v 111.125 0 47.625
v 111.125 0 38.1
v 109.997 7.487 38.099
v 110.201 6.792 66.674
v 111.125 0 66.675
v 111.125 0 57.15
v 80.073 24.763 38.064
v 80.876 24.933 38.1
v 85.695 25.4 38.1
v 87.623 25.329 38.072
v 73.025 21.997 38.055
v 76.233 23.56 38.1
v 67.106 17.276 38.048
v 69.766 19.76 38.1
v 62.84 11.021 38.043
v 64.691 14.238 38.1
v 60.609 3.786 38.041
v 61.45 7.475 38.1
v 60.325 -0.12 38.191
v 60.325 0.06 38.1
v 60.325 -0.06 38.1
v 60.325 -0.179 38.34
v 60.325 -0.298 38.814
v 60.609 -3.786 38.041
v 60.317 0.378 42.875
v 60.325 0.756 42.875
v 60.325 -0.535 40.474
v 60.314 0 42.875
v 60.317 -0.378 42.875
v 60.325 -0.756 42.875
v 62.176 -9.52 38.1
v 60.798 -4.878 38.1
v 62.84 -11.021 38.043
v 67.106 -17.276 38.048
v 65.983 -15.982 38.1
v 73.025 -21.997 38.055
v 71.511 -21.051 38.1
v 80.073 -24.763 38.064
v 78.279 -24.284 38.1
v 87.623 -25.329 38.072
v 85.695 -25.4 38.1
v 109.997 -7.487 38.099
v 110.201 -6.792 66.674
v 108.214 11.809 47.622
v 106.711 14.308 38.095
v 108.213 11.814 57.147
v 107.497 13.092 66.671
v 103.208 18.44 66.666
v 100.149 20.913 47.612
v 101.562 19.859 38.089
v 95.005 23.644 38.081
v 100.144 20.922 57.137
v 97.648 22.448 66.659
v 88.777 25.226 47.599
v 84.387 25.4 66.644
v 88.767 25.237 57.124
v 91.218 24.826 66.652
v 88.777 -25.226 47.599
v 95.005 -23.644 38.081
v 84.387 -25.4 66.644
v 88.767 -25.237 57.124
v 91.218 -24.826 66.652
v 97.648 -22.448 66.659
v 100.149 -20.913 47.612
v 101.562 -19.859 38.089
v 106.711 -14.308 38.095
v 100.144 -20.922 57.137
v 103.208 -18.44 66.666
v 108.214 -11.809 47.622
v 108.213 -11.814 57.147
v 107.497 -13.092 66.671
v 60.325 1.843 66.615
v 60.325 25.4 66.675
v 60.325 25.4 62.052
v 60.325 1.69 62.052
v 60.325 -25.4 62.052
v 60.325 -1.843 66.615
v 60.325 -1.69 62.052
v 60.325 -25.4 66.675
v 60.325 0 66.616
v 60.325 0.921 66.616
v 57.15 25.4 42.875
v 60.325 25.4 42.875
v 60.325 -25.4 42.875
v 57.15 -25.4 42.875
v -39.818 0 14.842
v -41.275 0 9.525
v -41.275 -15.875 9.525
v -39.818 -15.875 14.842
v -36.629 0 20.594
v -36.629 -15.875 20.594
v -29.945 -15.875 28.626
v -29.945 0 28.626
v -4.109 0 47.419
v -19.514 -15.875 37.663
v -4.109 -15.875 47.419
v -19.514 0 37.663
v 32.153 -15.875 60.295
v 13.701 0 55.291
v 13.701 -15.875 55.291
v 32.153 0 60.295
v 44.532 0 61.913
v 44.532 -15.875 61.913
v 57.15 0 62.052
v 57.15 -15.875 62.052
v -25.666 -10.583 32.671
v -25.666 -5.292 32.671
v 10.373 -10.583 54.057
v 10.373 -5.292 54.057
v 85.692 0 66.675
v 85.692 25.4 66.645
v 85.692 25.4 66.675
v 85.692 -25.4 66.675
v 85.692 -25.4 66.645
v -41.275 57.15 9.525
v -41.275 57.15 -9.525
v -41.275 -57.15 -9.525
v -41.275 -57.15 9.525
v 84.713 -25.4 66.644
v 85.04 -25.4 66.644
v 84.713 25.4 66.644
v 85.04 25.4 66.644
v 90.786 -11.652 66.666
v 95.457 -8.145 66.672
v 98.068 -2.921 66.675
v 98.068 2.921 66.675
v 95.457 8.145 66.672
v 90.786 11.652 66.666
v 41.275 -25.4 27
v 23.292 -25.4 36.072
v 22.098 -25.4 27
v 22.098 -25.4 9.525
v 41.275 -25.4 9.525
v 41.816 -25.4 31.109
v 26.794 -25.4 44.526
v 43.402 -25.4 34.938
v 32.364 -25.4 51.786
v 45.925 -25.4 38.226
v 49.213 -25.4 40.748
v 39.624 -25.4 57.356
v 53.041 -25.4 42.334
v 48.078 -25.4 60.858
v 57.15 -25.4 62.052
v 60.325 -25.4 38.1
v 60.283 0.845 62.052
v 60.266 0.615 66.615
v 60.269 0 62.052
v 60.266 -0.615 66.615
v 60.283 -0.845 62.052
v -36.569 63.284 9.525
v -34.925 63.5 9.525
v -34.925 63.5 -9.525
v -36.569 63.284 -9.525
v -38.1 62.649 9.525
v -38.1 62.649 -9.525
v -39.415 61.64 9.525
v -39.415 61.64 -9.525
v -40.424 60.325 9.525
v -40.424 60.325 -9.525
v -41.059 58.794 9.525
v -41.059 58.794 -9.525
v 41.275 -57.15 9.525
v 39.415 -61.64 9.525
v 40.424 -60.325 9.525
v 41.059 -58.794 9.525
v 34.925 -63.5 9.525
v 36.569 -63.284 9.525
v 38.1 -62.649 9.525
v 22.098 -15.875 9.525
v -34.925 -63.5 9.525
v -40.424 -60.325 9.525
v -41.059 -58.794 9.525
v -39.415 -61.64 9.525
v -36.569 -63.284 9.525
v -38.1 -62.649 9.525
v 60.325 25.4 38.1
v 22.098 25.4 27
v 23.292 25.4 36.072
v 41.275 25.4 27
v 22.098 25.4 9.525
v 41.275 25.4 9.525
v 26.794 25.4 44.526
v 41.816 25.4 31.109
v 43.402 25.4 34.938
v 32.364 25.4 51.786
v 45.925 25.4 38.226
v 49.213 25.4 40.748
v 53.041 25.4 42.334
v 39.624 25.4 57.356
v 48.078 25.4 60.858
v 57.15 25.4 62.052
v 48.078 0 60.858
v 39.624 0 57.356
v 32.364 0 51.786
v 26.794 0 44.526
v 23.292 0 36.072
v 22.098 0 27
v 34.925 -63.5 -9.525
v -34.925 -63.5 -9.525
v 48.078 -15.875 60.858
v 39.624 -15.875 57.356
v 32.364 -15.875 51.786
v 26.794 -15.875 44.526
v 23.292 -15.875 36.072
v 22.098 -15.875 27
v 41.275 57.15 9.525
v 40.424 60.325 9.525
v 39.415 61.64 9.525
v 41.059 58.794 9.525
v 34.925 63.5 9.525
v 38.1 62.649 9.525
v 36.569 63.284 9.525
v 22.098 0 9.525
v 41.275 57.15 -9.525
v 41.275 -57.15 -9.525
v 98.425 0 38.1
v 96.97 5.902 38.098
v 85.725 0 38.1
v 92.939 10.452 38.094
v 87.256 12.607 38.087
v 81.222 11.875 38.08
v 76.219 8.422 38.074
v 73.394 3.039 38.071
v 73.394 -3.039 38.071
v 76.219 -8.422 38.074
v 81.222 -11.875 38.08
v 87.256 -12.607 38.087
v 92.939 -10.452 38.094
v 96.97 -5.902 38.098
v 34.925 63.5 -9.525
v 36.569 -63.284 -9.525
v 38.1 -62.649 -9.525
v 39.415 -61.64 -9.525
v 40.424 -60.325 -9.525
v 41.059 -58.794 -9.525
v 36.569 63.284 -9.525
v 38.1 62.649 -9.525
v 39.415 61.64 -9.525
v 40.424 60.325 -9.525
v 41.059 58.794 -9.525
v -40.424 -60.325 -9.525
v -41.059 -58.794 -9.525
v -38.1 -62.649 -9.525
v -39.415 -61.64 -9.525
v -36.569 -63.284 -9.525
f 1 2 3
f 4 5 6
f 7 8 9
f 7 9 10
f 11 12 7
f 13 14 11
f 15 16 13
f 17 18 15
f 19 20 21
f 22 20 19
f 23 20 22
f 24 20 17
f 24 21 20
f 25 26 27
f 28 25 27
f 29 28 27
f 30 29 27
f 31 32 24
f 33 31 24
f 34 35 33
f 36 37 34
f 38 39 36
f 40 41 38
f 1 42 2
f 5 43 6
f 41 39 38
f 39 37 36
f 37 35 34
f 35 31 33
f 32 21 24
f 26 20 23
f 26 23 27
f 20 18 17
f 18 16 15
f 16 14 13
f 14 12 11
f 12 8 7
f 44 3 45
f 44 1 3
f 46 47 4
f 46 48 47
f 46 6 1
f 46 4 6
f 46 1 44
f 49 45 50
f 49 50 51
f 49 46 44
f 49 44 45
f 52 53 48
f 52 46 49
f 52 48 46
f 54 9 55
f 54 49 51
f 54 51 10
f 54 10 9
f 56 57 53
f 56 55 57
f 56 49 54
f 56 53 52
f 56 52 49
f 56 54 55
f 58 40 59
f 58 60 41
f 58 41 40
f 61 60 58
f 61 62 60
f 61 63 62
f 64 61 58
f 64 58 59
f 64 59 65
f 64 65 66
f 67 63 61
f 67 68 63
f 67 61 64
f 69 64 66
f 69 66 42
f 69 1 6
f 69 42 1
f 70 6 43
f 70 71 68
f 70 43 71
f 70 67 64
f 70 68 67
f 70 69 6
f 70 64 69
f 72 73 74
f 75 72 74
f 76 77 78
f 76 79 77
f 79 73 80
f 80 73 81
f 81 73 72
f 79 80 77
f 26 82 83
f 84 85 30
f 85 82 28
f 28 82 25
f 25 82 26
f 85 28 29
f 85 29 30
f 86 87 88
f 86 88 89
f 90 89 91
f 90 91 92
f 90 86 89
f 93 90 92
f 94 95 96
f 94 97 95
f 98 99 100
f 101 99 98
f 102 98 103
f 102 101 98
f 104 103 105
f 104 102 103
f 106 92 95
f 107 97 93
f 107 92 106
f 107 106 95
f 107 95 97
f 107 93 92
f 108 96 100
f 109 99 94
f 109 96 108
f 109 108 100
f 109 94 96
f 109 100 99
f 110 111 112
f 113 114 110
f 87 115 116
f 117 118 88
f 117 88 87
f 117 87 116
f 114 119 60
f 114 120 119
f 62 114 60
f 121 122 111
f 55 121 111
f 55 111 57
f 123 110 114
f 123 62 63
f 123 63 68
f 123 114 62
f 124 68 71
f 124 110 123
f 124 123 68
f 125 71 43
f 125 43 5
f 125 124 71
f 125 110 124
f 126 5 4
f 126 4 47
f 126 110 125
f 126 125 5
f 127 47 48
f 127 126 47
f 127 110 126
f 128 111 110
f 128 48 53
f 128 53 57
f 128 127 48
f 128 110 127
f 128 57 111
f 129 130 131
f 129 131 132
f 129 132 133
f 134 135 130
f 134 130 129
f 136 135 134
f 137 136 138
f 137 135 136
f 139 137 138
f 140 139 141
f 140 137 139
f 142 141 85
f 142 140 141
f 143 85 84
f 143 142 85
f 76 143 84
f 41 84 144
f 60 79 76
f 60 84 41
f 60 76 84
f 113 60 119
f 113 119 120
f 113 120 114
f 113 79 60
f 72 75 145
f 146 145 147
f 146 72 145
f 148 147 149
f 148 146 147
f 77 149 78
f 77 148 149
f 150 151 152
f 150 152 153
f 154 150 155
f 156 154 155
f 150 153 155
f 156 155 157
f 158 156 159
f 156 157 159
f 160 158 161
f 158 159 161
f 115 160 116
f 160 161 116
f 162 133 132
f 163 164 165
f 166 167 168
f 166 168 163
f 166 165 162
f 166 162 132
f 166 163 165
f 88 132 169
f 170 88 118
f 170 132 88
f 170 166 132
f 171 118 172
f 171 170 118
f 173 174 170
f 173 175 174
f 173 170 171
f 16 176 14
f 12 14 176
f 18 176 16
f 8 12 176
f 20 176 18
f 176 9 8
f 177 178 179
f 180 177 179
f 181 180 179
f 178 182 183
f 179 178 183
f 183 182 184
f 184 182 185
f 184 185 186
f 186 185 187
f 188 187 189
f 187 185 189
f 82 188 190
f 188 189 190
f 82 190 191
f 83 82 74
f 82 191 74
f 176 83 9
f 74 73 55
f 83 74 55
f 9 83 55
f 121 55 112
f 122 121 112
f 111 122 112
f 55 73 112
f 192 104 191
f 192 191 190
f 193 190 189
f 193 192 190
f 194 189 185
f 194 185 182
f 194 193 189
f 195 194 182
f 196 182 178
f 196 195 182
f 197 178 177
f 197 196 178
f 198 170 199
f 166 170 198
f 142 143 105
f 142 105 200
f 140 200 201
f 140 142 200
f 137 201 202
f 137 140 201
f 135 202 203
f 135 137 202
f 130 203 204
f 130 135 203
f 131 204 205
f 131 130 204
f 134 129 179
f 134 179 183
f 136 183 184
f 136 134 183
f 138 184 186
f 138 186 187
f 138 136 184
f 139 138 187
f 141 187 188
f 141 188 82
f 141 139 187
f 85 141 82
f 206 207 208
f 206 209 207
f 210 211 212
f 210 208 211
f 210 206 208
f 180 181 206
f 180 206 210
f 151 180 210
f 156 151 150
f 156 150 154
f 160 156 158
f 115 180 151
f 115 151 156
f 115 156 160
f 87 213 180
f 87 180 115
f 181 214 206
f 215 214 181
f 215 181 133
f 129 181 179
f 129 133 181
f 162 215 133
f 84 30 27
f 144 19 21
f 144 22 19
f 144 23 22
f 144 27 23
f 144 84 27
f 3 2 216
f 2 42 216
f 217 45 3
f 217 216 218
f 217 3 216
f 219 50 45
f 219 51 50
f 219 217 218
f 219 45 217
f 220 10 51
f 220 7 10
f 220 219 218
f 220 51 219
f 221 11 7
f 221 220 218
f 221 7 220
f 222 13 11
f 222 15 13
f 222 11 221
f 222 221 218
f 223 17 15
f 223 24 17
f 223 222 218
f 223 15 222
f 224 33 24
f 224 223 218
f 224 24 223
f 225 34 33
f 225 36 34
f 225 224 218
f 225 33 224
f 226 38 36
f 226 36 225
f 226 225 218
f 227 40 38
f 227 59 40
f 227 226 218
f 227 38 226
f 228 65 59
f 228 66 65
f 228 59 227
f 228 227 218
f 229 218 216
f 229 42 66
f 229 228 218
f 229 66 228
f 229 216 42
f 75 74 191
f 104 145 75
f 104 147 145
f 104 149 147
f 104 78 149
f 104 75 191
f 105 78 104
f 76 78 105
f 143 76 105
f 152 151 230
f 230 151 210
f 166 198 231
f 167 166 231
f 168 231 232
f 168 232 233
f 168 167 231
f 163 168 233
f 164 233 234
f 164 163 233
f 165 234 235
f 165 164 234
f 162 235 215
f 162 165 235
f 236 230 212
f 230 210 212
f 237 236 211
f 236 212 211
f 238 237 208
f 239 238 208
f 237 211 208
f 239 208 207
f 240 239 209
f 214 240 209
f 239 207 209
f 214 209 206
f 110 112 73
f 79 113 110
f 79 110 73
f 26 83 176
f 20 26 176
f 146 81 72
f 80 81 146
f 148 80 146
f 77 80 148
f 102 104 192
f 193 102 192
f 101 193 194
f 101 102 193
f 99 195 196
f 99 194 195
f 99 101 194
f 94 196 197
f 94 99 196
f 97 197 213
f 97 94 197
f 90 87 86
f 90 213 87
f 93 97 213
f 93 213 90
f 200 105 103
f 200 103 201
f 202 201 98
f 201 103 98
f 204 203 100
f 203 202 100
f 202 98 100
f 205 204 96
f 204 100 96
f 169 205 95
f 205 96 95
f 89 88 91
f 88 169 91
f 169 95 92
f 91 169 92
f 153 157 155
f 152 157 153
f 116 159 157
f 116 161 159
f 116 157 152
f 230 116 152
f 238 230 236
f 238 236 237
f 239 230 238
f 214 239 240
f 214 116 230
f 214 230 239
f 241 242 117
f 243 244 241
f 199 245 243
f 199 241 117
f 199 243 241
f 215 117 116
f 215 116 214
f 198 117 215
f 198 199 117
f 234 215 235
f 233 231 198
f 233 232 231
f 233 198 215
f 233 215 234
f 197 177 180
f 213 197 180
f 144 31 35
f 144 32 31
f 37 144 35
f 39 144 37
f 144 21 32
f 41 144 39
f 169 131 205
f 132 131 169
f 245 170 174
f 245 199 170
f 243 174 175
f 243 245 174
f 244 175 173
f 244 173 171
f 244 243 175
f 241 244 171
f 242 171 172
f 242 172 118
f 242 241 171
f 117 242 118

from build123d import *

# Parameters (mm, degrees)
F1_DEPTH = 63.5
F2_DEPTH = 25.4
F3_DEPTH = 15.875
F5_R     = 6.35


with BuildPart() as f1:
    # F0 (on Front) → F1 (new body, symmetric)
    with BuildSketch(Plane.XZ):
        Polygon((-41.275, -9.525), (41.275, -9.525), (41.275, 9.525), (22.098, 9.525), (-41.275, 9.525), align=None)
    extrude(amount=F1_DEPTH, both=True)

    # F0 (on Front) → F2 (join, symmetric)
    with BuildSketch(Plane.XZ):
        with BuildLine():
            Line((22.098, 9.525), (41.275, 9.525))
            Line((41.275, 9.525), (41.275, 27.0002))
            ThreePointArc((41.275, 27.0002), (45.9246798487, 38.2255201513), (57.15, 42.8752))
            Line((57.15, 42.8752), (60.325, 42.8752))
            Line((60.325, 42.8752), (60.325, 62.0522))
            Line((60.325, 62.0522), (57.15, 62.0522))
            ThreePointArc((57.15, 62.0522), (32.3644931058, 51.7857068942), (22.098, 27.0002))
            Line((22.098, 27.0002), (22.098, 9.525))
        make_face()
        Polygon((60.325, 66.675), (60.325, 62.0522), (60.325, 42.8752), (60.325, 38.1), (85.725, 38.1), (85.6915154391, 66.675), align=None)
    extrude(amount=F2_DEPTH, both=True)

    # F0 (on Front) → F3 (join)
    with BuildSketch(Plane.XZ):
        with BuildLine():
            add(Edge.make_bspline(
                [(-41.275, 9.525), (-39.1135952527, 29.6751279876), (8.2365749404, 64.628906548), (57.15, 62.0522)],
                knots=[0, 0, 0, 0, 111.5642745902, 111.5642745902, 111.5642745902, 111.5642745902], degree=3))
            Line((-41.275, 9.525), (22.098, 9.525))
            Line((22.098, 9.525), (22.098, 27.0002))
            ThreePointArc((22.098, 27.0002), (32.3644931058, 51.7857068942), (57.15, 62.0522))
        make_face()
    extrude(amount=F3_DEPTH)

    # F0 (on Front) → F4 (revolve)
    with BuildSketch(Plane.XZ):
        Polygon((111.125, 66.675), (85.6915154391, 66.675), (85.725, 38.1), (111.125, 38.1), align=None)
    revolve(axis=Axis((85.7082577195, 0, 52.3875), (-0.0011718124, 0, 0.9999993134)))

    # F5
    f5_edges = [f1.edges().sort_by_distance(p)[0] for p in [
        (-41.275, -63.5, 0),
        (41.275, -63.5, 0),
        (41.275, 63.5, 0),
        (-41.275, 63.5, 0),
    ]]
    fillet(f5_edges, radius=F5_R)


solid = f1.part
